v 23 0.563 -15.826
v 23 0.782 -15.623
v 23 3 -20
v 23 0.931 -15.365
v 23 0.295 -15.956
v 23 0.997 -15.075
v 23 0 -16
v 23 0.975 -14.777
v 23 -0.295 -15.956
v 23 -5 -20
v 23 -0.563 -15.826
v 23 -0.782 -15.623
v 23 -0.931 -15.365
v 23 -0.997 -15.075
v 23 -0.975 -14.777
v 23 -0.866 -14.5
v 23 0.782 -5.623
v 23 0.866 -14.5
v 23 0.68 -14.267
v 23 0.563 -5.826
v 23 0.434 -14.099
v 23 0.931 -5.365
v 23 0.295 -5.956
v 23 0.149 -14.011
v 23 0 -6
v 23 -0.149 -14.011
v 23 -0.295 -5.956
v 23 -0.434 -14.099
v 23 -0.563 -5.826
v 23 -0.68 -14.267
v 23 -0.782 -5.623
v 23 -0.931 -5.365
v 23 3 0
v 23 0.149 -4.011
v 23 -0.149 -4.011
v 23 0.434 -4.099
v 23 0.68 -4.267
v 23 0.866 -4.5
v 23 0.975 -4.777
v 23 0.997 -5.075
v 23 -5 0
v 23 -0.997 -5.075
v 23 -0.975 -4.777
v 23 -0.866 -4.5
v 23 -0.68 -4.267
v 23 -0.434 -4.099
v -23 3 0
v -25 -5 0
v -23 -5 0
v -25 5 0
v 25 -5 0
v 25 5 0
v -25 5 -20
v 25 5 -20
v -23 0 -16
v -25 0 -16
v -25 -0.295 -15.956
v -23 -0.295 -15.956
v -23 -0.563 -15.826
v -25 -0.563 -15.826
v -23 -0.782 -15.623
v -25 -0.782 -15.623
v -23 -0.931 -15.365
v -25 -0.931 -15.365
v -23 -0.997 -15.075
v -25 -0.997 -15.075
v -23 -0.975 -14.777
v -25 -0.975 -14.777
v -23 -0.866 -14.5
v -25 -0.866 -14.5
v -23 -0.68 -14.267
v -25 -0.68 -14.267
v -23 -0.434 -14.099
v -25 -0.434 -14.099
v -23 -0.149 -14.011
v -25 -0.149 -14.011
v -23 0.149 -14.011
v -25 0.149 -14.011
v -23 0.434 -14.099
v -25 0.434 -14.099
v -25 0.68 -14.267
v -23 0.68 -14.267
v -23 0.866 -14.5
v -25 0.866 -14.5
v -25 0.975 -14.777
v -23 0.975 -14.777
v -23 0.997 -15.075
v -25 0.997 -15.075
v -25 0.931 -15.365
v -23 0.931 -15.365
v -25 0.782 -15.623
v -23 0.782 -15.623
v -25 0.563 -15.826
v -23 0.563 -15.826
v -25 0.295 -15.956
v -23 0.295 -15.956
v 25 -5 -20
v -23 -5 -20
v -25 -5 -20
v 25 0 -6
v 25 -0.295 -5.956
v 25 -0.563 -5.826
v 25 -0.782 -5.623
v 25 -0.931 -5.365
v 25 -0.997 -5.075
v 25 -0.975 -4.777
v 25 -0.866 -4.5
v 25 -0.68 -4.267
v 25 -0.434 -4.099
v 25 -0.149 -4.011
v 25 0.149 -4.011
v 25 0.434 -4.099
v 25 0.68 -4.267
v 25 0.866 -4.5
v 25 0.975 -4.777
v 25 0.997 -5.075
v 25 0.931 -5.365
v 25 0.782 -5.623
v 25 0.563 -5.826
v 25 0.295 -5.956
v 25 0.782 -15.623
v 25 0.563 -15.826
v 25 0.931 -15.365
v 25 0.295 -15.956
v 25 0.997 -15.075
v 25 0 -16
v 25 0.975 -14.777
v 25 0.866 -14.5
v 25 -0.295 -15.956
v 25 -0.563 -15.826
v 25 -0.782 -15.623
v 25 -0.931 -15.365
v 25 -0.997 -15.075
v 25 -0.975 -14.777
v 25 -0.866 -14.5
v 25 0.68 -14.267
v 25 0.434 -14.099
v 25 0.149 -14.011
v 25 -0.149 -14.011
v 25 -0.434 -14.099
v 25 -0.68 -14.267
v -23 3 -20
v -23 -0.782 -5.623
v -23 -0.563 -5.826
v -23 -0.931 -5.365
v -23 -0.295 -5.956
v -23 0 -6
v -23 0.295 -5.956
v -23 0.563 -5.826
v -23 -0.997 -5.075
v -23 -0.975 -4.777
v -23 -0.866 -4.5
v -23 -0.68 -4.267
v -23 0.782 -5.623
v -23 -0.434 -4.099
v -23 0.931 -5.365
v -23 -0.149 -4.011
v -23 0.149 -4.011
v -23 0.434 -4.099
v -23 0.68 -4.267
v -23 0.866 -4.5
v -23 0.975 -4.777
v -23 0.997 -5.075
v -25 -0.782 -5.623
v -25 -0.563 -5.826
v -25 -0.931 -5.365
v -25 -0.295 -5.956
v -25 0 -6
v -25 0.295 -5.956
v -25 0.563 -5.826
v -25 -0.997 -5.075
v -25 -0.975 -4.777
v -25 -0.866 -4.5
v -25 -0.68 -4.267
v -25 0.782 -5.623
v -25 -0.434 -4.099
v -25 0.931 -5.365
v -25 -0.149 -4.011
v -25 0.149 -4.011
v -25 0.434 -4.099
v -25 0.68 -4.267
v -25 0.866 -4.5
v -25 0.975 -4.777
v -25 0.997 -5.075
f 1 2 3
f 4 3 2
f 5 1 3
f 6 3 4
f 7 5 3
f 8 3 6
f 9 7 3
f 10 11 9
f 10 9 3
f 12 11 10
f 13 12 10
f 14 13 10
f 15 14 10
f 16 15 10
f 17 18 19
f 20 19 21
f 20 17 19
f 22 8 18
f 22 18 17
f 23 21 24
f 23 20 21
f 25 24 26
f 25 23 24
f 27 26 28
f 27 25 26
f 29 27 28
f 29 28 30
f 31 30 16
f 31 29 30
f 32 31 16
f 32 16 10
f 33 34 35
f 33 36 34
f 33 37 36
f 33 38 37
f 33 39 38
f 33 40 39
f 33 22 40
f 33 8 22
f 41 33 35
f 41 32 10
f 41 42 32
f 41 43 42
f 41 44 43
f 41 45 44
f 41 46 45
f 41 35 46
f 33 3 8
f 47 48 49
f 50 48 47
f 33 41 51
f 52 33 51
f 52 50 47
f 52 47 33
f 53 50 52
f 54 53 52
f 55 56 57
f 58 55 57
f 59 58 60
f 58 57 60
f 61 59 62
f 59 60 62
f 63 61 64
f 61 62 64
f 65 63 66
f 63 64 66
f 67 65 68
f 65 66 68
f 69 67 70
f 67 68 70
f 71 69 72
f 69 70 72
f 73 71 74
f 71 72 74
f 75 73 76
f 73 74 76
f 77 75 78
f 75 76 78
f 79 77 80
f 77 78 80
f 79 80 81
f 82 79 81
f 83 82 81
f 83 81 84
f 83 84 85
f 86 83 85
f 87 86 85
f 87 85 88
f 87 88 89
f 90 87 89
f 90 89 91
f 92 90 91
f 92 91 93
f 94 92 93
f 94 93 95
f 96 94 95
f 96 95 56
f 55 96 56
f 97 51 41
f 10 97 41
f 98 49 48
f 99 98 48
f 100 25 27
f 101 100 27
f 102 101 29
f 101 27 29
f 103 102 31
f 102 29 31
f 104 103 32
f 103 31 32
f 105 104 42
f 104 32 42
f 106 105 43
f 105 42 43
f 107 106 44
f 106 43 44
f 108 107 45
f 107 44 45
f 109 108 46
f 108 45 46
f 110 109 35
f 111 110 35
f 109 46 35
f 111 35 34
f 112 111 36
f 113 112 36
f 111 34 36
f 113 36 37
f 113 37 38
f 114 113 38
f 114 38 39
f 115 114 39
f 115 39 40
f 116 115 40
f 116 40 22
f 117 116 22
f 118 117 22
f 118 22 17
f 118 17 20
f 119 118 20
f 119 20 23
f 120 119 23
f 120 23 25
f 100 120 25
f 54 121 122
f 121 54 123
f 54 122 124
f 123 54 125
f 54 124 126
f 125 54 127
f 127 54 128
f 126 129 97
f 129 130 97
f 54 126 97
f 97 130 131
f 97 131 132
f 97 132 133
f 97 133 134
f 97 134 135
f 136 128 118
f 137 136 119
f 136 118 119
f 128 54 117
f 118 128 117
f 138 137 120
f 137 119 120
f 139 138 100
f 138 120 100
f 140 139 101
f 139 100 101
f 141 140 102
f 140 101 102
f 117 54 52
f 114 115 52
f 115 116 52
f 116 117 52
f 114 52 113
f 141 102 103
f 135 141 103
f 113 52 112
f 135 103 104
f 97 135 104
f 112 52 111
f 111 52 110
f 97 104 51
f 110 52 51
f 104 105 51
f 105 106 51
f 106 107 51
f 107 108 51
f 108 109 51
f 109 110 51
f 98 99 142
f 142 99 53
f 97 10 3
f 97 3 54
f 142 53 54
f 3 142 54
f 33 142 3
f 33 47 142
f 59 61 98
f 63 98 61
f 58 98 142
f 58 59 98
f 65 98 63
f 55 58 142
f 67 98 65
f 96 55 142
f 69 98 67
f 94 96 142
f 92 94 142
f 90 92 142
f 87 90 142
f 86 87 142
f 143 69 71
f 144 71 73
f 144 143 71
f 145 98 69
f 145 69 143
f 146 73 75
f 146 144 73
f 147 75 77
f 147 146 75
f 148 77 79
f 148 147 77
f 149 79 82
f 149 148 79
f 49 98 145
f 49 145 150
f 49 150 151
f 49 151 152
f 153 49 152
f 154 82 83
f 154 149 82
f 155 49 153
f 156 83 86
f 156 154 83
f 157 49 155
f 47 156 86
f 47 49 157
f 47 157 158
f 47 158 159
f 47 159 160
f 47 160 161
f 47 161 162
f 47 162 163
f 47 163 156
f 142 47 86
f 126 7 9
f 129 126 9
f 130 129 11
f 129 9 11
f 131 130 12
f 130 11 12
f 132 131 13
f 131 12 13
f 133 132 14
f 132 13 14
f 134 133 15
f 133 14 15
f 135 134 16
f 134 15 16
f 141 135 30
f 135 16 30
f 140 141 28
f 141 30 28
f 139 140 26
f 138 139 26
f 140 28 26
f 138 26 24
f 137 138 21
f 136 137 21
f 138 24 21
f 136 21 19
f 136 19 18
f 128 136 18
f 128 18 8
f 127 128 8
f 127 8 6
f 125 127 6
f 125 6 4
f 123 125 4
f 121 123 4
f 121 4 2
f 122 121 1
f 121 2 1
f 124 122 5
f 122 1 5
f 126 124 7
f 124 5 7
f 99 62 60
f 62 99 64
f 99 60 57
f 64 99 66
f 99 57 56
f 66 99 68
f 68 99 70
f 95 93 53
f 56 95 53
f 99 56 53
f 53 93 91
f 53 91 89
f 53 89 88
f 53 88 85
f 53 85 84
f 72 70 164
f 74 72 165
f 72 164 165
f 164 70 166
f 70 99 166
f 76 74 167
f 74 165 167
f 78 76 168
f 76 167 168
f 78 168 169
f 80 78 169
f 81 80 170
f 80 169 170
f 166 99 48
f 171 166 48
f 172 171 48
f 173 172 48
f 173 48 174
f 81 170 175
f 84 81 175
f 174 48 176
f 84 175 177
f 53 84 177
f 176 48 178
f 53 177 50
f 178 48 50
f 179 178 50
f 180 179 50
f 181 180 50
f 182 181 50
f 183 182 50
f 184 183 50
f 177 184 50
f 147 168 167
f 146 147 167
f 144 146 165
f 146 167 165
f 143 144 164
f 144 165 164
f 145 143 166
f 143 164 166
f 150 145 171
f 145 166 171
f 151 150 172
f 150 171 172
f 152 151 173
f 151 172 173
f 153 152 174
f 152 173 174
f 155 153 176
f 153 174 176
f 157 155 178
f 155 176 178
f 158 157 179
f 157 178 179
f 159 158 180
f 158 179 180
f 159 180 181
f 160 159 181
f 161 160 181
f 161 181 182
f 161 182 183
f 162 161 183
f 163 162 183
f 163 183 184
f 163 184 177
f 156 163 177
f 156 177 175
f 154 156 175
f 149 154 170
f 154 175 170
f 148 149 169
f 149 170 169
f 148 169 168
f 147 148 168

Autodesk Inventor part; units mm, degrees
ref_plane "YZ Plane" through (0, 0, 0) normal (1, 0, 0) x (0, 1, 0)
ref_plane "XZ Plane" through (0, 0, 0) normal (0, 1, 0) x (-1, 0, 0)
ref_plane "XY Plane" through (0, 0, 0) normal (0, 0, 1) x (1, 0, 0)
sketch "スケッチ1" plane through (0, 0, 0) normal (0, 0, 1) x (1, 0, 0)
  line L0 (-25, 5) -> (25, 5)
  line L1 (25, 5) -> (25, -5)
  line L2 (-25, -5) -> (-25, 5)
  line L3 (-23, 3) -> (23, 3)
  line L4 (23, 3) -> (23, -5)
  line L5 (-23, -5) -> (-23, 3)
  line L6 (25, -5) -> (23, -5)
  line L7 (-23, -5) -> (-25, -5)
  point P0 (0, 0)
  dimension "d0" = 50
  dimension "d2" = 46
  dimension "d3" = 23
  dimension "d4" = 25
  dimension "d5" = 10
  dimension "d6" = 10
  dimension "d8" = 5
  dimension "d9" = 8
extrude "押し出し1" add sketch "スケッチ1" against normal blind 20
sketch "スケッチ2" plane through (25, -5, 0) normal (1, 0, 0) x (0, 0, -1)
  line L0 (0, 10) -> (0, 0) projected
  line L1 (0, 10) -> (20, 10) projected
  circle A0 centre (5, 5) radius 1
  circle A1 centre (15, 5) radius 1
  point P0 (0, 5)
  dimension "d14" = 5
  dimension "d15" = 5
  dimension "d16" = 5
  dimension "d17" = 10
  dimension "d18" = 2
hole "穴1" at (25, 0, -5) at (25, 0, -15) direction (-1, 0, 0) diameter 2 end through all
thread "ねじ3" size "M2x0.4" class "6H" standard "ANSI Metric M Profile" full length
thread "ねじ4" size "M2x0.4" class "6H" standard "ANSI Metric M Profile" full length
thread "ねじ5" size "M2x0.4" class "6H" standard "ANSI Metric M Profile" full length
thread "ねじ6" size "M2x0.4" class "6H" standard "ANSI Metric M Profile" full length
properties part number "Leg_Link_Conecter" material "アルミニウム 6061"
